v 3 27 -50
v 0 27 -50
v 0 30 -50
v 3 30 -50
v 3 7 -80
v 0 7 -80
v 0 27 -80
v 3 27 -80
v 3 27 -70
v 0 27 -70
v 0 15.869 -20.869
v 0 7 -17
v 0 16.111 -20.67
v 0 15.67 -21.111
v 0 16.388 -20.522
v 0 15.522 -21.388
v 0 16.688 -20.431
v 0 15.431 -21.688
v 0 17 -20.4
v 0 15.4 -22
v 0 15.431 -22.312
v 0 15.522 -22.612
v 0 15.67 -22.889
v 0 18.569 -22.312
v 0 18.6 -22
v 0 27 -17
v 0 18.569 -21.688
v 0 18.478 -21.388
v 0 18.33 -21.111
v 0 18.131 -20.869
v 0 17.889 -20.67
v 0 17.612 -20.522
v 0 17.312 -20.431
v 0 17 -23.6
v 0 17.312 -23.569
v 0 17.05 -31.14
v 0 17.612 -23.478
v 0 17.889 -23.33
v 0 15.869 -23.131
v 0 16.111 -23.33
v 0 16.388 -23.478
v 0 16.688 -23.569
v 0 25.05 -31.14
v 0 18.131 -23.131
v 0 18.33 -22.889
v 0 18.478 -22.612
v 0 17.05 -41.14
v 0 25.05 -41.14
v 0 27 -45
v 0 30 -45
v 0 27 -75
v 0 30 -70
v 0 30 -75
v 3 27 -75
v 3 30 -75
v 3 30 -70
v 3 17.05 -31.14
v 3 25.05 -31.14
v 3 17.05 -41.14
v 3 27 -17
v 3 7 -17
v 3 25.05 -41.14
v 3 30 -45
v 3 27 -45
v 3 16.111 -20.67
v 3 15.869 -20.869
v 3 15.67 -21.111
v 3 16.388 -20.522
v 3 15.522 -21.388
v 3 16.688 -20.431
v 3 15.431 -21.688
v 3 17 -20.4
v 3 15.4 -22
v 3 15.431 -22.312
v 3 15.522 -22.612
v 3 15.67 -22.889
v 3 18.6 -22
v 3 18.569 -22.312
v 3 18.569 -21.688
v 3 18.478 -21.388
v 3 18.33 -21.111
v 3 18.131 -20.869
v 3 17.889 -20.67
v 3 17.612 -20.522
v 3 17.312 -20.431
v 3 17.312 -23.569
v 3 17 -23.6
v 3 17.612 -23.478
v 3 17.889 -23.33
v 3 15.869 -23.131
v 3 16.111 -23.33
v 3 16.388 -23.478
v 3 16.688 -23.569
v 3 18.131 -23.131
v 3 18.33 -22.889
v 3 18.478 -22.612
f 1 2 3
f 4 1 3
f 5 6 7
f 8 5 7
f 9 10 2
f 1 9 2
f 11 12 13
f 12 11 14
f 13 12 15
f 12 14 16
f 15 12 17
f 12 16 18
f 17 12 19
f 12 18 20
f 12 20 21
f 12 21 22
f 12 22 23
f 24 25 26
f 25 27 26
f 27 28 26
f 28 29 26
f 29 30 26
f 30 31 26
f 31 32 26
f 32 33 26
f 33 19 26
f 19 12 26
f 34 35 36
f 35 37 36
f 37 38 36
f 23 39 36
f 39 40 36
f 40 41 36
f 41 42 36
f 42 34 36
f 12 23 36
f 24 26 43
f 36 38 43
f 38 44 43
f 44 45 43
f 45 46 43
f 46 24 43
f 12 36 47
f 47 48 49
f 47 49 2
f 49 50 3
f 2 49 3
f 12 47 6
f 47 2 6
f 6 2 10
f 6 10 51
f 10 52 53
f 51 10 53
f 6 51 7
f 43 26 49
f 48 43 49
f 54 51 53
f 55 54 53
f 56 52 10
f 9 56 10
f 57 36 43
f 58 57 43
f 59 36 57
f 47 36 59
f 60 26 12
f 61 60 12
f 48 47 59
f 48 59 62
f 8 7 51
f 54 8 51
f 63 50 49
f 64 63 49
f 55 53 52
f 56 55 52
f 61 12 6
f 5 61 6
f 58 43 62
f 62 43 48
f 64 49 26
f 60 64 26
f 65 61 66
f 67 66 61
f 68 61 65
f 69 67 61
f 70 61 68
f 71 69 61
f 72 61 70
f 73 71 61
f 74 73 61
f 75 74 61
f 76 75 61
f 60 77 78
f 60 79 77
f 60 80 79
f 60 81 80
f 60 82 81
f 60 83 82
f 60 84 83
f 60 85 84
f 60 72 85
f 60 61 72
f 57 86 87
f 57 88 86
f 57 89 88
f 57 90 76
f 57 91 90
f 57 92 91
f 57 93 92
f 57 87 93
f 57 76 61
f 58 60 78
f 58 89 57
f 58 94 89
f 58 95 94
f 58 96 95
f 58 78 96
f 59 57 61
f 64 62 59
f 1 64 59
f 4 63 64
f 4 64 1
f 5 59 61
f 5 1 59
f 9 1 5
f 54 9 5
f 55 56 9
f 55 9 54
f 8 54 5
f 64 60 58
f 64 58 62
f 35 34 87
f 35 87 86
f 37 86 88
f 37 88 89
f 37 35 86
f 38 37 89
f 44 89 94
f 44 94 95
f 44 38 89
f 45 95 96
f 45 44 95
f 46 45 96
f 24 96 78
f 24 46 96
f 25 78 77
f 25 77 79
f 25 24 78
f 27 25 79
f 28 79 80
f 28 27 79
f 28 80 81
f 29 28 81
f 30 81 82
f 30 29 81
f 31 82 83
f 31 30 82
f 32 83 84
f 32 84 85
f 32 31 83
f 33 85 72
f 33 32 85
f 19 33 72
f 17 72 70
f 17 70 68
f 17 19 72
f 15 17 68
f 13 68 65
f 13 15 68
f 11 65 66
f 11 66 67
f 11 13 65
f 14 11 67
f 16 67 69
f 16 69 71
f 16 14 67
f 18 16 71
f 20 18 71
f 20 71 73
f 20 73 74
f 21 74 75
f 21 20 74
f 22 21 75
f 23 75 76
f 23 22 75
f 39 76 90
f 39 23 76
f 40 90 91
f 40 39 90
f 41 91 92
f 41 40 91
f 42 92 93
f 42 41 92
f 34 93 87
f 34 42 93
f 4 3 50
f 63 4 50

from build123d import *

# Parameters (mm, degrees)
SKETCH_1_R      = 1.6
SKETCH_1_W      = 10
SKETCH_1_H      = 8
EXTRUDE_1_DEPTH = 3


with BuildPart() as part:
    # ｽｹｯﾁ1 → ﾎﾞｽ - 押し出し1 (new body)
    with BuildSketch(Plane(origin=(0, 0, 0), x_dir=(0, 0, -1), z_dir=(1, 0, 0))):
        Polygon((17, 27), (17, 7), (80, 7), (80, 27), (75, 27), (75, 30), (70, 30), (70, 27), (50, 27), (50, 30), (45, 30), (45, 27), align=None)
        with Locations((22, 17)):
            Circle(SKETCH_1_R, mode=Mode.SUBTRACT)
        with Locations((36.14, 21.05)):
            Rectangle(SKETCH_1_W, SKETCH_1_H, mode=Mode.SUBTRACT)
    extrude(amount=EXTRUDE_1_DEPTH)


solid = part.part
